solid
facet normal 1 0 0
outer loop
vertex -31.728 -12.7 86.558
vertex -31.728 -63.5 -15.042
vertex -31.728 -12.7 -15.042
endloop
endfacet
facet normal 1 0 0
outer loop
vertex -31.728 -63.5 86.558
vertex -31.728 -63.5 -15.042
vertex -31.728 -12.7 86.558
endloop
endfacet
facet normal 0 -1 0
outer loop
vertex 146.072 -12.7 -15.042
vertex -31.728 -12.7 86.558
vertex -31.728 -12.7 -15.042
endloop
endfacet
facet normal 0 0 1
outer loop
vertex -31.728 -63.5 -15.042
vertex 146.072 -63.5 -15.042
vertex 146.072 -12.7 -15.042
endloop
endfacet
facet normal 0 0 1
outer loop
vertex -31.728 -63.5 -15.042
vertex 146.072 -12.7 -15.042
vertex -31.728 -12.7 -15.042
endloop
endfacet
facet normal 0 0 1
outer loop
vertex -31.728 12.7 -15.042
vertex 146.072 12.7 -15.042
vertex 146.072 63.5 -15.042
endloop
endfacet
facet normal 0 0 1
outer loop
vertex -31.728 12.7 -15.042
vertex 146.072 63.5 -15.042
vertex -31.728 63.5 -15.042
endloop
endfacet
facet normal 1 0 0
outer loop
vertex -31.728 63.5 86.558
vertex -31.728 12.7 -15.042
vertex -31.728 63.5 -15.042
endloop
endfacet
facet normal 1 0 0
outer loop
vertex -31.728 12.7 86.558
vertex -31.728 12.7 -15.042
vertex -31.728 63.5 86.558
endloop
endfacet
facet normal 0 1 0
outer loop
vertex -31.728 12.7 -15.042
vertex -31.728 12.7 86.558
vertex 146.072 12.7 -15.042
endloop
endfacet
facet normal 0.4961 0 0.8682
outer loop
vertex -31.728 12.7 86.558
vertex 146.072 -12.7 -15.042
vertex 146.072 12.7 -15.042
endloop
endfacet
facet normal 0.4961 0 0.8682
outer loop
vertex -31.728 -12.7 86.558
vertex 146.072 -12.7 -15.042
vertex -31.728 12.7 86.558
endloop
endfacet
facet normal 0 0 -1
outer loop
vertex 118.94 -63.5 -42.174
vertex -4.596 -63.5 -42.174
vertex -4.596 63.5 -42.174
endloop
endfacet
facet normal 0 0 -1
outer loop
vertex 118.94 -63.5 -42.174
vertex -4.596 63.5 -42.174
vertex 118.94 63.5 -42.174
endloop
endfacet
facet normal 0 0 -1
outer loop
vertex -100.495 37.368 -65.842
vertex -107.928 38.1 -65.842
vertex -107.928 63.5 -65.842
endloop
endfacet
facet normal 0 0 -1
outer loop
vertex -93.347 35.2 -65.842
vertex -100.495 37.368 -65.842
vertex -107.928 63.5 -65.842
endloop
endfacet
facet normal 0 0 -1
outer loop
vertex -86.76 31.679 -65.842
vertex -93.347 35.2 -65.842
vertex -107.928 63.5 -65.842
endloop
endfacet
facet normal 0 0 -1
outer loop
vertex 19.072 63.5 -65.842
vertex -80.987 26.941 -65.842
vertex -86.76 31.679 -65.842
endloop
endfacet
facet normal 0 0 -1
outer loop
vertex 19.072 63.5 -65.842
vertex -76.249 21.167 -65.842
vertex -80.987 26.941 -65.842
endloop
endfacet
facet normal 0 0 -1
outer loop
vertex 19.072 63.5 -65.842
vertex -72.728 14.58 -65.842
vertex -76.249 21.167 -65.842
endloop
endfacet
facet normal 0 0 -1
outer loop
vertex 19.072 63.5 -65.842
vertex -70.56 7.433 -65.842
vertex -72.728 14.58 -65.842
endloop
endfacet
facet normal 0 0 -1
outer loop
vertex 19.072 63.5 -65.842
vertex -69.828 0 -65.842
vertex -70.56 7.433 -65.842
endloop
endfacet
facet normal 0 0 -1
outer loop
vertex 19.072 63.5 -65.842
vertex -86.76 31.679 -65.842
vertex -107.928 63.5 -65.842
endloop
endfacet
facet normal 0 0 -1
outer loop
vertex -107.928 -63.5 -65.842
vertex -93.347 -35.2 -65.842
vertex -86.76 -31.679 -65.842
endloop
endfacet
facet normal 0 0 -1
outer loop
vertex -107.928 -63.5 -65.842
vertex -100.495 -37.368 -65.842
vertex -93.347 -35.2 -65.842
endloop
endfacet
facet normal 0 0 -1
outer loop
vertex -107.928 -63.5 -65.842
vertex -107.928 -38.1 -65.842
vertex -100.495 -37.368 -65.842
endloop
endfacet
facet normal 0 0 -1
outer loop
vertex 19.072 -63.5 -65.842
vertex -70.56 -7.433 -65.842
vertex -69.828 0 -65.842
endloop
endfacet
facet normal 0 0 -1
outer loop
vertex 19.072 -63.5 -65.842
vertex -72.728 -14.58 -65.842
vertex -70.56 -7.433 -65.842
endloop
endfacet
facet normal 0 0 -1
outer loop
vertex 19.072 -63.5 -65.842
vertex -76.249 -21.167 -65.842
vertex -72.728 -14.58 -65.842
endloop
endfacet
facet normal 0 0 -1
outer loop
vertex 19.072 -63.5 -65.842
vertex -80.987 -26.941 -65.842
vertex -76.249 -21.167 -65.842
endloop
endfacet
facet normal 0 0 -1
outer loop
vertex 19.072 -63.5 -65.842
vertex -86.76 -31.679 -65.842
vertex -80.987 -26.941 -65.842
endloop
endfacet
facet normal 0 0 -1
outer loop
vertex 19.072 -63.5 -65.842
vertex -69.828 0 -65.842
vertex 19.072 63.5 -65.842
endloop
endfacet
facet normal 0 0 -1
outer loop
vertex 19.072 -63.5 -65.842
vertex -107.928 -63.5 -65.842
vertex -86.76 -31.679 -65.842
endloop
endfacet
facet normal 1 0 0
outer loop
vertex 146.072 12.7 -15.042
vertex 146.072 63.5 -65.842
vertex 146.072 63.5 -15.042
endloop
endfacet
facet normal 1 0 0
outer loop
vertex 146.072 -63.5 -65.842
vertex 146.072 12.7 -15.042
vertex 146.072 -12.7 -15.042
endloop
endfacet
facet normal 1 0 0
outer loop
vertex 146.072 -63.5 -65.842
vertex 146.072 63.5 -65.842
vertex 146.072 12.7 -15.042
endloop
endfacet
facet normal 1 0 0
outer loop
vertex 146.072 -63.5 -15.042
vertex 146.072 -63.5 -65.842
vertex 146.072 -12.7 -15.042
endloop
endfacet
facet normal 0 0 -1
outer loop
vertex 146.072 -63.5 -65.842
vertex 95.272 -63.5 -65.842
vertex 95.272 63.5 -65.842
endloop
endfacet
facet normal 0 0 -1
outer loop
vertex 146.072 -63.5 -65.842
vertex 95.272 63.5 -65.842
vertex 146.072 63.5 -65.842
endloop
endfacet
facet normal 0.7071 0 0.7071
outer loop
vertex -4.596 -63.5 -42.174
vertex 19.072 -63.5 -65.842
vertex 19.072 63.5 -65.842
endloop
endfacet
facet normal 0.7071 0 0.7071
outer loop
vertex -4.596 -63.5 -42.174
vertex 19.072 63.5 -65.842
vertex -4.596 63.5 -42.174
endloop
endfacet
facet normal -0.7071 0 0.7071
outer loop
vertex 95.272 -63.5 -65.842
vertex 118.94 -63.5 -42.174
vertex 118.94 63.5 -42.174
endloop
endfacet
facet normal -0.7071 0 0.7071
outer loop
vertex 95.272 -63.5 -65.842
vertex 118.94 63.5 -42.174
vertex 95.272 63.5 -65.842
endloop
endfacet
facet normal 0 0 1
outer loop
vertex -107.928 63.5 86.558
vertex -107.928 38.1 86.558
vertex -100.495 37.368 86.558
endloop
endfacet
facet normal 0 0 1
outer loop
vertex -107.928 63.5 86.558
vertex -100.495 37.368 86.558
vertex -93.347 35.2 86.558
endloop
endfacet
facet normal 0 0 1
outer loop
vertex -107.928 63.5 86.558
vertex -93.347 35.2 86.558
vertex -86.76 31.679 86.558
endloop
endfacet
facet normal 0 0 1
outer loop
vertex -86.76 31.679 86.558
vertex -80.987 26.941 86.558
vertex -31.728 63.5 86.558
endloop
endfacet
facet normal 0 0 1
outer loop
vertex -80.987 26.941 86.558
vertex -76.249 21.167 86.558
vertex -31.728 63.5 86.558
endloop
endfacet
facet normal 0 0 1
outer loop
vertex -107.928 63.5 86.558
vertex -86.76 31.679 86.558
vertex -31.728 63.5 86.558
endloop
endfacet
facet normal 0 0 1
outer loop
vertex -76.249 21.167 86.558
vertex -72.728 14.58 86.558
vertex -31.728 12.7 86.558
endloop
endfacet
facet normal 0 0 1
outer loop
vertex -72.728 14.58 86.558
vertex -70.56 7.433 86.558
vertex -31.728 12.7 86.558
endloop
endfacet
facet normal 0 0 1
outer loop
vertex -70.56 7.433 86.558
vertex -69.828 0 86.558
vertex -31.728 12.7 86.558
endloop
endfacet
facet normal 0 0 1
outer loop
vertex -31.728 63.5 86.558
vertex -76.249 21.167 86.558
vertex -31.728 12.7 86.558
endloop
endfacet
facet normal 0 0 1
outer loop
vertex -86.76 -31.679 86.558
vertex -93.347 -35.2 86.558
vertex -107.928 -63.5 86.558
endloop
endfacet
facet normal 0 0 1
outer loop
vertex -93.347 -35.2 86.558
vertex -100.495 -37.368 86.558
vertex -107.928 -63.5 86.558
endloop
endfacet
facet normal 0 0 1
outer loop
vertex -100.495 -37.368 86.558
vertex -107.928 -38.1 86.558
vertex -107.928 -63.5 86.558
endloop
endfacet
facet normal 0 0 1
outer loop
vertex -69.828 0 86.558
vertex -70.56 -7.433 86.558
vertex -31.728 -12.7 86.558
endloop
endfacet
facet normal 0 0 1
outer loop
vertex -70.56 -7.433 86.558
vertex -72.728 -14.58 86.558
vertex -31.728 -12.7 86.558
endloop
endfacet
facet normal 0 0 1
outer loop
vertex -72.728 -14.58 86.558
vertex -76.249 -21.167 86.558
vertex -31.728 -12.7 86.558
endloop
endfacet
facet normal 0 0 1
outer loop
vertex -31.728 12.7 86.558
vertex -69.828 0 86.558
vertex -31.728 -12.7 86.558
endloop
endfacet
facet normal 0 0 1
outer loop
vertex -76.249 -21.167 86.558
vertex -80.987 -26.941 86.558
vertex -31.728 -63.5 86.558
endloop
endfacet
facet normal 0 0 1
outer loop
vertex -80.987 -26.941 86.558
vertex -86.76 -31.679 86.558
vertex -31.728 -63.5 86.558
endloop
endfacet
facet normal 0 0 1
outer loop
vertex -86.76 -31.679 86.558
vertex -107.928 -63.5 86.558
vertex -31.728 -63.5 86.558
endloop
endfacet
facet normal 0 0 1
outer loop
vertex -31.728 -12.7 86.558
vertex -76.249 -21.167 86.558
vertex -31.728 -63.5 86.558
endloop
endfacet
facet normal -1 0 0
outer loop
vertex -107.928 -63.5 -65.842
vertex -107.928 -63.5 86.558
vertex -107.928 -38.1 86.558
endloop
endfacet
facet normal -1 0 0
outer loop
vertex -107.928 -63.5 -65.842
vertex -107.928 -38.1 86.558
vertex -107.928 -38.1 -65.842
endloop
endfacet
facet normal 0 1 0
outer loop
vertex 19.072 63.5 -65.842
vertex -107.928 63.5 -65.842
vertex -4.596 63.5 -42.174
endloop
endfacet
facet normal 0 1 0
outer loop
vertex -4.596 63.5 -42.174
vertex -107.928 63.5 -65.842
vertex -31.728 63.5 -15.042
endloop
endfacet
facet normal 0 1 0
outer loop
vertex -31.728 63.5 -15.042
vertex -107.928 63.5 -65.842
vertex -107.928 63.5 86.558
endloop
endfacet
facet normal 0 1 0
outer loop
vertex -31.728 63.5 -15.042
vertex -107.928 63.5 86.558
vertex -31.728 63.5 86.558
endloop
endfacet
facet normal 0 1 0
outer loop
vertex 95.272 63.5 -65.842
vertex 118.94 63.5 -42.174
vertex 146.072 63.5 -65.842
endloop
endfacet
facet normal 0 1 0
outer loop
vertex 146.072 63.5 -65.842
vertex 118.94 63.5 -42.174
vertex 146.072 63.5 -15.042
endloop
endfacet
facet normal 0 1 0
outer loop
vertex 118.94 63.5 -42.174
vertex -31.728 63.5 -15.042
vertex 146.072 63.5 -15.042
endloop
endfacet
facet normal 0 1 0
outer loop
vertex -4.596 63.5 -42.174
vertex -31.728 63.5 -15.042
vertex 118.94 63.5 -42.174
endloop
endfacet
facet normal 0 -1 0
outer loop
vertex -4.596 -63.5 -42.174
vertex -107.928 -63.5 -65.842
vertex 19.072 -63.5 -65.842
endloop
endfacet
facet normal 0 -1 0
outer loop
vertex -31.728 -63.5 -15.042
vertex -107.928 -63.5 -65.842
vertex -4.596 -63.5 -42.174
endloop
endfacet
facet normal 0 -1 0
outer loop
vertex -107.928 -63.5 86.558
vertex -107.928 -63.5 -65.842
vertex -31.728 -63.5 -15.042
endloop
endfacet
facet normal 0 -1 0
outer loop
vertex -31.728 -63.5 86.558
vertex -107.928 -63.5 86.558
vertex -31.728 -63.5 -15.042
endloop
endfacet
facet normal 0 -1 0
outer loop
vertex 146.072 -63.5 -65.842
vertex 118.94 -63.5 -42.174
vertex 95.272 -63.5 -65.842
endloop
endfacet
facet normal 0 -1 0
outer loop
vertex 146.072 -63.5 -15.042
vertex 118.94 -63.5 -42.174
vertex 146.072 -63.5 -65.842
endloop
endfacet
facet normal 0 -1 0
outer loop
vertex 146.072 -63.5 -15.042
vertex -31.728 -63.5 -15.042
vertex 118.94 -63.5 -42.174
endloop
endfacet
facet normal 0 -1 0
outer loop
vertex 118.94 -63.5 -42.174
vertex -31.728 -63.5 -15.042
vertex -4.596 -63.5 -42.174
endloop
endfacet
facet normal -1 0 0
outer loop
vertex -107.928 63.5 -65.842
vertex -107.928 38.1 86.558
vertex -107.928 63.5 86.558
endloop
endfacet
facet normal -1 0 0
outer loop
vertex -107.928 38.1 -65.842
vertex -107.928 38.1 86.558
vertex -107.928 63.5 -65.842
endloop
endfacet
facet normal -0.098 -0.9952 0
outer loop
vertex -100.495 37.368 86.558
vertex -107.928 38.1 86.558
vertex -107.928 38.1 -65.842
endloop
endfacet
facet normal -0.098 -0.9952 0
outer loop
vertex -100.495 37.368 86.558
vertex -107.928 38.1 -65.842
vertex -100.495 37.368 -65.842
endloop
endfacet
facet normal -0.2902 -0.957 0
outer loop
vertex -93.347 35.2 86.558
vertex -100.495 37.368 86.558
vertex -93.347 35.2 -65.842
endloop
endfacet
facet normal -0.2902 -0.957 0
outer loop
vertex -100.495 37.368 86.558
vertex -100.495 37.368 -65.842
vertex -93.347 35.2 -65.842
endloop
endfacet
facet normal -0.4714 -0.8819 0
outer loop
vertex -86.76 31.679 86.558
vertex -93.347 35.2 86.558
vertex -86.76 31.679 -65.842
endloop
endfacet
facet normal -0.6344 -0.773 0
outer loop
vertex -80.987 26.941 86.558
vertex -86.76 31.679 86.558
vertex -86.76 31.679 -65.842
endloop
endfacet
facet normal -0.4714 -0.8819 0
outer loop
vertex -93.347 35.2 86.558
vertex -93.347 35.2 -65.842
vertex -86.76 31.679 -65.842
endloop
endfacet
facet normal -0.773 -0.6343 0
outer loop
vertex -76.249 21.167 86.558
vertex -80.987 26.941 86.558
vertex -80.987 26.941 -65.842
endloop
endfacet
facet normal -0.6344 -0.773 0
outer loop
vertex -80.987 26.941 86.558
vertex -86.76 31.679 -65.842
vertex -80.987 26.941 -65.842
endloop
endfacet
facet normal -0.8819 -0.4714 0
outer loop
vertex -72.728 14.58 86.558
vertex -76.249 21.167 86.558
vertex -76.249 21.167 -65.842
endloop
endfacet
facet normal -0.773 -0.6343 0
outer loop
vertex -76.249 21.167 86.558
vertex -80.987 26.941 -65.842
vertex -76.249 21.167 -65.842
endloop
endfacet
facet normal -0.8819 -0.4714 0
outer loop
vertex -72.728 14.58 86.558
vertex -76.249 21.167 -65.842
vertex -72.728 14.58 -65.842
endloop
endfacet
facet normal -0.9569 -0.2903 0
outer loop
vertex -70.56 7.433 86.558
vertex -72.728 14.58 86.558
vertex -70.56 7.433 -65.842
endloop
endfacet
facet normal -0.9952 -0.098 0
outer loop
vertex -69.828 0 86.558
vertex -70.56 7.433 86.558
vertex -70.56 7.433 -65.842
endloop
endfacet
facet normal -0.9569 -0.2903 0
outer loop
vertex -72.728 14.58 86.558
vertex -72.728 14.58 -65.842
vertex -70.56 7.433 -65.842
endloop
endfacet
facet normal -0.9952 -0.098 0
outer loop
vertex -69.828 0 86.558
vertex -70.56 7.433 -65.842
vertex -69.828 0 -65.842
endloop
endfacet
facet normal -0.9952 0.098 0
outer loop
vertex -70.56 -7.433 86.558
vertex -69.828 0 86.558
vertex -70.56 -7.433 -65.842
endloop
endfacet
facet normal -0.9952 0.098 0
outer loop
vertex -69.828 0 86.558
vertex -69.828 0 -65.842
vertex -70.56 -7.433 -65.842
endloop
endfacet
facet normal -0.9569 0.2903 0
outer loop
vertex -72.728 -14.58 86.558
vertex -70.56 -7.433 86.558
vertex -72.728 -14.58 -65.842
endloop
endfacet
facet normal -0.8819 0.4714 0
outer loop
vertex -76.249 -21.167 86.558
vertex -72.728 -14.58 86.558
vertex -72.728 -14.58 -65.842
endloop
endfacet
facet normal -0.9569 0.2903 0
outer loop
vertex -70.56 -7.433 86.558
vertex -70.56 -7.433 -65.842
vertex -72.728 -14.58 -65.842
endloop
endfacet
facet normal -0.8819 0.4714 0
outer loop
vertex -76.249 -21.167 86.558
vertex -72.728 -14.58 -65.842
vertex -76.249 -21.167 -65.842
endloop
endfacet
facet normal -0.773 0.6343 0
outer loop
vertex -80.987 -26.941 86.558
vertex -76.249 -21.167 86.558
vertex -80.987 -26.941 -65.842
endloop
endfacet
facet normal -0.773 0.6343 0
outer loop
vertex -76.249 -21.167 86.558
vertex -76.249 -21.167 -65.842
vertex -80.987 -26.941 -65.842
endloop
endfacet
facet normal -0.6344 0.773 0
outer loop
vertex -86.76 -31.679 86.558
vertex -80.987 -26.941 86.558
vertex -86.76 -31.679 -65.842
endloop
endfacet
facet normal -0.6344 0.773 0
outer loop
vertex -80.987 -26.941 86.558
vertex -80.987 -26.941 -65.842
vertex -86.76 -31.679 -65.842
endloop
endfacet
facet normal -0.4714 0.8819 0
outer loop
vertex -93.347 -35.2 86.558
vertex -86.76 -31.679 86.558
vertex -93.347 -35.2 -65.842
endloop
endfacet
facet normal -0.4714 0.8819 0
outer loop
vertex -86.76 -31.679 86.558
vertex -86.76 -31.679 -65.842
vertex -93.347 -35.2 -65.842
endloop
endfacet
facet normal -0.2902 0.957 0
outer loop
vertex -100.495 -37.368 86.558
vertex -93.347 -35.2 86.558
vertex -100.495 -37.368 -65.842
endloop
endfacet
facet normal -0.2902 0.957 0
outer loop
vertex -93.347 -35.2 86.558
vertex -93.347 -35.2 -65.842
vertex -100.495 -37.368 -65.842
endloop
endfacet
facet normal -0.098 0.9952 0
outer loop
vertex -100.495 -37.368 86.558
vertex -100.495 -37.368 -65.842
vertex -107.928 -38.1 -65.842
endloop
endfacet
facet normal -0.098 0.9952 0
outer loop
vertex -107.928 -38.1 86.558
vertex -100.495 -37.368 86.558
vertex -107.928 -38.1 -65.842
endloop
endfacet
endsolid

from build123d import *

# Parameters (mm, degrees)
F1_DEPTH = 12.7
F0_W     = 76.2
F0_H     = 101.6
F2_DEPTH = 63.5
F4_D     = 76.2


with BuildPart() as f1:
    # F0 (on Front) → F1 (new body, symmetric)
    with BuildSketch(Plane.XZ):
        Polygon((146.07237, -15.042048), (-31.72763, 86.557952), (-31.72763, -15.042048), align=None)
    extrude(amount=F1_DEPTH, both=True)

    # F0 (on Front) → F2 (join, symmetric)
    with BuildSketch(Plane.XZ):
        with Locations((-69.82763, 35.757952)):
            Rectangle(F0_W, F0_H)
        Polygon((146.07237, -65.842048), (146.07237, -15.042048), (-31.72763, -15.042048), (-107.92763, -15.042048), (-107.92763, -65.842048), (19.07237, -65.842048), (-4.595719, -42.173959), (118.940459, -42.173959), (95.27237, -65.842048), align=None)
    extrude(amount=F2_DEPTH, both=True)

    # F4 (through all)
    with Locations(Plane.XY.offset(86.557952)):
        with Locations((-107.92763, 0)):
            Hole(F4_D / 2)


solid = f1.part
